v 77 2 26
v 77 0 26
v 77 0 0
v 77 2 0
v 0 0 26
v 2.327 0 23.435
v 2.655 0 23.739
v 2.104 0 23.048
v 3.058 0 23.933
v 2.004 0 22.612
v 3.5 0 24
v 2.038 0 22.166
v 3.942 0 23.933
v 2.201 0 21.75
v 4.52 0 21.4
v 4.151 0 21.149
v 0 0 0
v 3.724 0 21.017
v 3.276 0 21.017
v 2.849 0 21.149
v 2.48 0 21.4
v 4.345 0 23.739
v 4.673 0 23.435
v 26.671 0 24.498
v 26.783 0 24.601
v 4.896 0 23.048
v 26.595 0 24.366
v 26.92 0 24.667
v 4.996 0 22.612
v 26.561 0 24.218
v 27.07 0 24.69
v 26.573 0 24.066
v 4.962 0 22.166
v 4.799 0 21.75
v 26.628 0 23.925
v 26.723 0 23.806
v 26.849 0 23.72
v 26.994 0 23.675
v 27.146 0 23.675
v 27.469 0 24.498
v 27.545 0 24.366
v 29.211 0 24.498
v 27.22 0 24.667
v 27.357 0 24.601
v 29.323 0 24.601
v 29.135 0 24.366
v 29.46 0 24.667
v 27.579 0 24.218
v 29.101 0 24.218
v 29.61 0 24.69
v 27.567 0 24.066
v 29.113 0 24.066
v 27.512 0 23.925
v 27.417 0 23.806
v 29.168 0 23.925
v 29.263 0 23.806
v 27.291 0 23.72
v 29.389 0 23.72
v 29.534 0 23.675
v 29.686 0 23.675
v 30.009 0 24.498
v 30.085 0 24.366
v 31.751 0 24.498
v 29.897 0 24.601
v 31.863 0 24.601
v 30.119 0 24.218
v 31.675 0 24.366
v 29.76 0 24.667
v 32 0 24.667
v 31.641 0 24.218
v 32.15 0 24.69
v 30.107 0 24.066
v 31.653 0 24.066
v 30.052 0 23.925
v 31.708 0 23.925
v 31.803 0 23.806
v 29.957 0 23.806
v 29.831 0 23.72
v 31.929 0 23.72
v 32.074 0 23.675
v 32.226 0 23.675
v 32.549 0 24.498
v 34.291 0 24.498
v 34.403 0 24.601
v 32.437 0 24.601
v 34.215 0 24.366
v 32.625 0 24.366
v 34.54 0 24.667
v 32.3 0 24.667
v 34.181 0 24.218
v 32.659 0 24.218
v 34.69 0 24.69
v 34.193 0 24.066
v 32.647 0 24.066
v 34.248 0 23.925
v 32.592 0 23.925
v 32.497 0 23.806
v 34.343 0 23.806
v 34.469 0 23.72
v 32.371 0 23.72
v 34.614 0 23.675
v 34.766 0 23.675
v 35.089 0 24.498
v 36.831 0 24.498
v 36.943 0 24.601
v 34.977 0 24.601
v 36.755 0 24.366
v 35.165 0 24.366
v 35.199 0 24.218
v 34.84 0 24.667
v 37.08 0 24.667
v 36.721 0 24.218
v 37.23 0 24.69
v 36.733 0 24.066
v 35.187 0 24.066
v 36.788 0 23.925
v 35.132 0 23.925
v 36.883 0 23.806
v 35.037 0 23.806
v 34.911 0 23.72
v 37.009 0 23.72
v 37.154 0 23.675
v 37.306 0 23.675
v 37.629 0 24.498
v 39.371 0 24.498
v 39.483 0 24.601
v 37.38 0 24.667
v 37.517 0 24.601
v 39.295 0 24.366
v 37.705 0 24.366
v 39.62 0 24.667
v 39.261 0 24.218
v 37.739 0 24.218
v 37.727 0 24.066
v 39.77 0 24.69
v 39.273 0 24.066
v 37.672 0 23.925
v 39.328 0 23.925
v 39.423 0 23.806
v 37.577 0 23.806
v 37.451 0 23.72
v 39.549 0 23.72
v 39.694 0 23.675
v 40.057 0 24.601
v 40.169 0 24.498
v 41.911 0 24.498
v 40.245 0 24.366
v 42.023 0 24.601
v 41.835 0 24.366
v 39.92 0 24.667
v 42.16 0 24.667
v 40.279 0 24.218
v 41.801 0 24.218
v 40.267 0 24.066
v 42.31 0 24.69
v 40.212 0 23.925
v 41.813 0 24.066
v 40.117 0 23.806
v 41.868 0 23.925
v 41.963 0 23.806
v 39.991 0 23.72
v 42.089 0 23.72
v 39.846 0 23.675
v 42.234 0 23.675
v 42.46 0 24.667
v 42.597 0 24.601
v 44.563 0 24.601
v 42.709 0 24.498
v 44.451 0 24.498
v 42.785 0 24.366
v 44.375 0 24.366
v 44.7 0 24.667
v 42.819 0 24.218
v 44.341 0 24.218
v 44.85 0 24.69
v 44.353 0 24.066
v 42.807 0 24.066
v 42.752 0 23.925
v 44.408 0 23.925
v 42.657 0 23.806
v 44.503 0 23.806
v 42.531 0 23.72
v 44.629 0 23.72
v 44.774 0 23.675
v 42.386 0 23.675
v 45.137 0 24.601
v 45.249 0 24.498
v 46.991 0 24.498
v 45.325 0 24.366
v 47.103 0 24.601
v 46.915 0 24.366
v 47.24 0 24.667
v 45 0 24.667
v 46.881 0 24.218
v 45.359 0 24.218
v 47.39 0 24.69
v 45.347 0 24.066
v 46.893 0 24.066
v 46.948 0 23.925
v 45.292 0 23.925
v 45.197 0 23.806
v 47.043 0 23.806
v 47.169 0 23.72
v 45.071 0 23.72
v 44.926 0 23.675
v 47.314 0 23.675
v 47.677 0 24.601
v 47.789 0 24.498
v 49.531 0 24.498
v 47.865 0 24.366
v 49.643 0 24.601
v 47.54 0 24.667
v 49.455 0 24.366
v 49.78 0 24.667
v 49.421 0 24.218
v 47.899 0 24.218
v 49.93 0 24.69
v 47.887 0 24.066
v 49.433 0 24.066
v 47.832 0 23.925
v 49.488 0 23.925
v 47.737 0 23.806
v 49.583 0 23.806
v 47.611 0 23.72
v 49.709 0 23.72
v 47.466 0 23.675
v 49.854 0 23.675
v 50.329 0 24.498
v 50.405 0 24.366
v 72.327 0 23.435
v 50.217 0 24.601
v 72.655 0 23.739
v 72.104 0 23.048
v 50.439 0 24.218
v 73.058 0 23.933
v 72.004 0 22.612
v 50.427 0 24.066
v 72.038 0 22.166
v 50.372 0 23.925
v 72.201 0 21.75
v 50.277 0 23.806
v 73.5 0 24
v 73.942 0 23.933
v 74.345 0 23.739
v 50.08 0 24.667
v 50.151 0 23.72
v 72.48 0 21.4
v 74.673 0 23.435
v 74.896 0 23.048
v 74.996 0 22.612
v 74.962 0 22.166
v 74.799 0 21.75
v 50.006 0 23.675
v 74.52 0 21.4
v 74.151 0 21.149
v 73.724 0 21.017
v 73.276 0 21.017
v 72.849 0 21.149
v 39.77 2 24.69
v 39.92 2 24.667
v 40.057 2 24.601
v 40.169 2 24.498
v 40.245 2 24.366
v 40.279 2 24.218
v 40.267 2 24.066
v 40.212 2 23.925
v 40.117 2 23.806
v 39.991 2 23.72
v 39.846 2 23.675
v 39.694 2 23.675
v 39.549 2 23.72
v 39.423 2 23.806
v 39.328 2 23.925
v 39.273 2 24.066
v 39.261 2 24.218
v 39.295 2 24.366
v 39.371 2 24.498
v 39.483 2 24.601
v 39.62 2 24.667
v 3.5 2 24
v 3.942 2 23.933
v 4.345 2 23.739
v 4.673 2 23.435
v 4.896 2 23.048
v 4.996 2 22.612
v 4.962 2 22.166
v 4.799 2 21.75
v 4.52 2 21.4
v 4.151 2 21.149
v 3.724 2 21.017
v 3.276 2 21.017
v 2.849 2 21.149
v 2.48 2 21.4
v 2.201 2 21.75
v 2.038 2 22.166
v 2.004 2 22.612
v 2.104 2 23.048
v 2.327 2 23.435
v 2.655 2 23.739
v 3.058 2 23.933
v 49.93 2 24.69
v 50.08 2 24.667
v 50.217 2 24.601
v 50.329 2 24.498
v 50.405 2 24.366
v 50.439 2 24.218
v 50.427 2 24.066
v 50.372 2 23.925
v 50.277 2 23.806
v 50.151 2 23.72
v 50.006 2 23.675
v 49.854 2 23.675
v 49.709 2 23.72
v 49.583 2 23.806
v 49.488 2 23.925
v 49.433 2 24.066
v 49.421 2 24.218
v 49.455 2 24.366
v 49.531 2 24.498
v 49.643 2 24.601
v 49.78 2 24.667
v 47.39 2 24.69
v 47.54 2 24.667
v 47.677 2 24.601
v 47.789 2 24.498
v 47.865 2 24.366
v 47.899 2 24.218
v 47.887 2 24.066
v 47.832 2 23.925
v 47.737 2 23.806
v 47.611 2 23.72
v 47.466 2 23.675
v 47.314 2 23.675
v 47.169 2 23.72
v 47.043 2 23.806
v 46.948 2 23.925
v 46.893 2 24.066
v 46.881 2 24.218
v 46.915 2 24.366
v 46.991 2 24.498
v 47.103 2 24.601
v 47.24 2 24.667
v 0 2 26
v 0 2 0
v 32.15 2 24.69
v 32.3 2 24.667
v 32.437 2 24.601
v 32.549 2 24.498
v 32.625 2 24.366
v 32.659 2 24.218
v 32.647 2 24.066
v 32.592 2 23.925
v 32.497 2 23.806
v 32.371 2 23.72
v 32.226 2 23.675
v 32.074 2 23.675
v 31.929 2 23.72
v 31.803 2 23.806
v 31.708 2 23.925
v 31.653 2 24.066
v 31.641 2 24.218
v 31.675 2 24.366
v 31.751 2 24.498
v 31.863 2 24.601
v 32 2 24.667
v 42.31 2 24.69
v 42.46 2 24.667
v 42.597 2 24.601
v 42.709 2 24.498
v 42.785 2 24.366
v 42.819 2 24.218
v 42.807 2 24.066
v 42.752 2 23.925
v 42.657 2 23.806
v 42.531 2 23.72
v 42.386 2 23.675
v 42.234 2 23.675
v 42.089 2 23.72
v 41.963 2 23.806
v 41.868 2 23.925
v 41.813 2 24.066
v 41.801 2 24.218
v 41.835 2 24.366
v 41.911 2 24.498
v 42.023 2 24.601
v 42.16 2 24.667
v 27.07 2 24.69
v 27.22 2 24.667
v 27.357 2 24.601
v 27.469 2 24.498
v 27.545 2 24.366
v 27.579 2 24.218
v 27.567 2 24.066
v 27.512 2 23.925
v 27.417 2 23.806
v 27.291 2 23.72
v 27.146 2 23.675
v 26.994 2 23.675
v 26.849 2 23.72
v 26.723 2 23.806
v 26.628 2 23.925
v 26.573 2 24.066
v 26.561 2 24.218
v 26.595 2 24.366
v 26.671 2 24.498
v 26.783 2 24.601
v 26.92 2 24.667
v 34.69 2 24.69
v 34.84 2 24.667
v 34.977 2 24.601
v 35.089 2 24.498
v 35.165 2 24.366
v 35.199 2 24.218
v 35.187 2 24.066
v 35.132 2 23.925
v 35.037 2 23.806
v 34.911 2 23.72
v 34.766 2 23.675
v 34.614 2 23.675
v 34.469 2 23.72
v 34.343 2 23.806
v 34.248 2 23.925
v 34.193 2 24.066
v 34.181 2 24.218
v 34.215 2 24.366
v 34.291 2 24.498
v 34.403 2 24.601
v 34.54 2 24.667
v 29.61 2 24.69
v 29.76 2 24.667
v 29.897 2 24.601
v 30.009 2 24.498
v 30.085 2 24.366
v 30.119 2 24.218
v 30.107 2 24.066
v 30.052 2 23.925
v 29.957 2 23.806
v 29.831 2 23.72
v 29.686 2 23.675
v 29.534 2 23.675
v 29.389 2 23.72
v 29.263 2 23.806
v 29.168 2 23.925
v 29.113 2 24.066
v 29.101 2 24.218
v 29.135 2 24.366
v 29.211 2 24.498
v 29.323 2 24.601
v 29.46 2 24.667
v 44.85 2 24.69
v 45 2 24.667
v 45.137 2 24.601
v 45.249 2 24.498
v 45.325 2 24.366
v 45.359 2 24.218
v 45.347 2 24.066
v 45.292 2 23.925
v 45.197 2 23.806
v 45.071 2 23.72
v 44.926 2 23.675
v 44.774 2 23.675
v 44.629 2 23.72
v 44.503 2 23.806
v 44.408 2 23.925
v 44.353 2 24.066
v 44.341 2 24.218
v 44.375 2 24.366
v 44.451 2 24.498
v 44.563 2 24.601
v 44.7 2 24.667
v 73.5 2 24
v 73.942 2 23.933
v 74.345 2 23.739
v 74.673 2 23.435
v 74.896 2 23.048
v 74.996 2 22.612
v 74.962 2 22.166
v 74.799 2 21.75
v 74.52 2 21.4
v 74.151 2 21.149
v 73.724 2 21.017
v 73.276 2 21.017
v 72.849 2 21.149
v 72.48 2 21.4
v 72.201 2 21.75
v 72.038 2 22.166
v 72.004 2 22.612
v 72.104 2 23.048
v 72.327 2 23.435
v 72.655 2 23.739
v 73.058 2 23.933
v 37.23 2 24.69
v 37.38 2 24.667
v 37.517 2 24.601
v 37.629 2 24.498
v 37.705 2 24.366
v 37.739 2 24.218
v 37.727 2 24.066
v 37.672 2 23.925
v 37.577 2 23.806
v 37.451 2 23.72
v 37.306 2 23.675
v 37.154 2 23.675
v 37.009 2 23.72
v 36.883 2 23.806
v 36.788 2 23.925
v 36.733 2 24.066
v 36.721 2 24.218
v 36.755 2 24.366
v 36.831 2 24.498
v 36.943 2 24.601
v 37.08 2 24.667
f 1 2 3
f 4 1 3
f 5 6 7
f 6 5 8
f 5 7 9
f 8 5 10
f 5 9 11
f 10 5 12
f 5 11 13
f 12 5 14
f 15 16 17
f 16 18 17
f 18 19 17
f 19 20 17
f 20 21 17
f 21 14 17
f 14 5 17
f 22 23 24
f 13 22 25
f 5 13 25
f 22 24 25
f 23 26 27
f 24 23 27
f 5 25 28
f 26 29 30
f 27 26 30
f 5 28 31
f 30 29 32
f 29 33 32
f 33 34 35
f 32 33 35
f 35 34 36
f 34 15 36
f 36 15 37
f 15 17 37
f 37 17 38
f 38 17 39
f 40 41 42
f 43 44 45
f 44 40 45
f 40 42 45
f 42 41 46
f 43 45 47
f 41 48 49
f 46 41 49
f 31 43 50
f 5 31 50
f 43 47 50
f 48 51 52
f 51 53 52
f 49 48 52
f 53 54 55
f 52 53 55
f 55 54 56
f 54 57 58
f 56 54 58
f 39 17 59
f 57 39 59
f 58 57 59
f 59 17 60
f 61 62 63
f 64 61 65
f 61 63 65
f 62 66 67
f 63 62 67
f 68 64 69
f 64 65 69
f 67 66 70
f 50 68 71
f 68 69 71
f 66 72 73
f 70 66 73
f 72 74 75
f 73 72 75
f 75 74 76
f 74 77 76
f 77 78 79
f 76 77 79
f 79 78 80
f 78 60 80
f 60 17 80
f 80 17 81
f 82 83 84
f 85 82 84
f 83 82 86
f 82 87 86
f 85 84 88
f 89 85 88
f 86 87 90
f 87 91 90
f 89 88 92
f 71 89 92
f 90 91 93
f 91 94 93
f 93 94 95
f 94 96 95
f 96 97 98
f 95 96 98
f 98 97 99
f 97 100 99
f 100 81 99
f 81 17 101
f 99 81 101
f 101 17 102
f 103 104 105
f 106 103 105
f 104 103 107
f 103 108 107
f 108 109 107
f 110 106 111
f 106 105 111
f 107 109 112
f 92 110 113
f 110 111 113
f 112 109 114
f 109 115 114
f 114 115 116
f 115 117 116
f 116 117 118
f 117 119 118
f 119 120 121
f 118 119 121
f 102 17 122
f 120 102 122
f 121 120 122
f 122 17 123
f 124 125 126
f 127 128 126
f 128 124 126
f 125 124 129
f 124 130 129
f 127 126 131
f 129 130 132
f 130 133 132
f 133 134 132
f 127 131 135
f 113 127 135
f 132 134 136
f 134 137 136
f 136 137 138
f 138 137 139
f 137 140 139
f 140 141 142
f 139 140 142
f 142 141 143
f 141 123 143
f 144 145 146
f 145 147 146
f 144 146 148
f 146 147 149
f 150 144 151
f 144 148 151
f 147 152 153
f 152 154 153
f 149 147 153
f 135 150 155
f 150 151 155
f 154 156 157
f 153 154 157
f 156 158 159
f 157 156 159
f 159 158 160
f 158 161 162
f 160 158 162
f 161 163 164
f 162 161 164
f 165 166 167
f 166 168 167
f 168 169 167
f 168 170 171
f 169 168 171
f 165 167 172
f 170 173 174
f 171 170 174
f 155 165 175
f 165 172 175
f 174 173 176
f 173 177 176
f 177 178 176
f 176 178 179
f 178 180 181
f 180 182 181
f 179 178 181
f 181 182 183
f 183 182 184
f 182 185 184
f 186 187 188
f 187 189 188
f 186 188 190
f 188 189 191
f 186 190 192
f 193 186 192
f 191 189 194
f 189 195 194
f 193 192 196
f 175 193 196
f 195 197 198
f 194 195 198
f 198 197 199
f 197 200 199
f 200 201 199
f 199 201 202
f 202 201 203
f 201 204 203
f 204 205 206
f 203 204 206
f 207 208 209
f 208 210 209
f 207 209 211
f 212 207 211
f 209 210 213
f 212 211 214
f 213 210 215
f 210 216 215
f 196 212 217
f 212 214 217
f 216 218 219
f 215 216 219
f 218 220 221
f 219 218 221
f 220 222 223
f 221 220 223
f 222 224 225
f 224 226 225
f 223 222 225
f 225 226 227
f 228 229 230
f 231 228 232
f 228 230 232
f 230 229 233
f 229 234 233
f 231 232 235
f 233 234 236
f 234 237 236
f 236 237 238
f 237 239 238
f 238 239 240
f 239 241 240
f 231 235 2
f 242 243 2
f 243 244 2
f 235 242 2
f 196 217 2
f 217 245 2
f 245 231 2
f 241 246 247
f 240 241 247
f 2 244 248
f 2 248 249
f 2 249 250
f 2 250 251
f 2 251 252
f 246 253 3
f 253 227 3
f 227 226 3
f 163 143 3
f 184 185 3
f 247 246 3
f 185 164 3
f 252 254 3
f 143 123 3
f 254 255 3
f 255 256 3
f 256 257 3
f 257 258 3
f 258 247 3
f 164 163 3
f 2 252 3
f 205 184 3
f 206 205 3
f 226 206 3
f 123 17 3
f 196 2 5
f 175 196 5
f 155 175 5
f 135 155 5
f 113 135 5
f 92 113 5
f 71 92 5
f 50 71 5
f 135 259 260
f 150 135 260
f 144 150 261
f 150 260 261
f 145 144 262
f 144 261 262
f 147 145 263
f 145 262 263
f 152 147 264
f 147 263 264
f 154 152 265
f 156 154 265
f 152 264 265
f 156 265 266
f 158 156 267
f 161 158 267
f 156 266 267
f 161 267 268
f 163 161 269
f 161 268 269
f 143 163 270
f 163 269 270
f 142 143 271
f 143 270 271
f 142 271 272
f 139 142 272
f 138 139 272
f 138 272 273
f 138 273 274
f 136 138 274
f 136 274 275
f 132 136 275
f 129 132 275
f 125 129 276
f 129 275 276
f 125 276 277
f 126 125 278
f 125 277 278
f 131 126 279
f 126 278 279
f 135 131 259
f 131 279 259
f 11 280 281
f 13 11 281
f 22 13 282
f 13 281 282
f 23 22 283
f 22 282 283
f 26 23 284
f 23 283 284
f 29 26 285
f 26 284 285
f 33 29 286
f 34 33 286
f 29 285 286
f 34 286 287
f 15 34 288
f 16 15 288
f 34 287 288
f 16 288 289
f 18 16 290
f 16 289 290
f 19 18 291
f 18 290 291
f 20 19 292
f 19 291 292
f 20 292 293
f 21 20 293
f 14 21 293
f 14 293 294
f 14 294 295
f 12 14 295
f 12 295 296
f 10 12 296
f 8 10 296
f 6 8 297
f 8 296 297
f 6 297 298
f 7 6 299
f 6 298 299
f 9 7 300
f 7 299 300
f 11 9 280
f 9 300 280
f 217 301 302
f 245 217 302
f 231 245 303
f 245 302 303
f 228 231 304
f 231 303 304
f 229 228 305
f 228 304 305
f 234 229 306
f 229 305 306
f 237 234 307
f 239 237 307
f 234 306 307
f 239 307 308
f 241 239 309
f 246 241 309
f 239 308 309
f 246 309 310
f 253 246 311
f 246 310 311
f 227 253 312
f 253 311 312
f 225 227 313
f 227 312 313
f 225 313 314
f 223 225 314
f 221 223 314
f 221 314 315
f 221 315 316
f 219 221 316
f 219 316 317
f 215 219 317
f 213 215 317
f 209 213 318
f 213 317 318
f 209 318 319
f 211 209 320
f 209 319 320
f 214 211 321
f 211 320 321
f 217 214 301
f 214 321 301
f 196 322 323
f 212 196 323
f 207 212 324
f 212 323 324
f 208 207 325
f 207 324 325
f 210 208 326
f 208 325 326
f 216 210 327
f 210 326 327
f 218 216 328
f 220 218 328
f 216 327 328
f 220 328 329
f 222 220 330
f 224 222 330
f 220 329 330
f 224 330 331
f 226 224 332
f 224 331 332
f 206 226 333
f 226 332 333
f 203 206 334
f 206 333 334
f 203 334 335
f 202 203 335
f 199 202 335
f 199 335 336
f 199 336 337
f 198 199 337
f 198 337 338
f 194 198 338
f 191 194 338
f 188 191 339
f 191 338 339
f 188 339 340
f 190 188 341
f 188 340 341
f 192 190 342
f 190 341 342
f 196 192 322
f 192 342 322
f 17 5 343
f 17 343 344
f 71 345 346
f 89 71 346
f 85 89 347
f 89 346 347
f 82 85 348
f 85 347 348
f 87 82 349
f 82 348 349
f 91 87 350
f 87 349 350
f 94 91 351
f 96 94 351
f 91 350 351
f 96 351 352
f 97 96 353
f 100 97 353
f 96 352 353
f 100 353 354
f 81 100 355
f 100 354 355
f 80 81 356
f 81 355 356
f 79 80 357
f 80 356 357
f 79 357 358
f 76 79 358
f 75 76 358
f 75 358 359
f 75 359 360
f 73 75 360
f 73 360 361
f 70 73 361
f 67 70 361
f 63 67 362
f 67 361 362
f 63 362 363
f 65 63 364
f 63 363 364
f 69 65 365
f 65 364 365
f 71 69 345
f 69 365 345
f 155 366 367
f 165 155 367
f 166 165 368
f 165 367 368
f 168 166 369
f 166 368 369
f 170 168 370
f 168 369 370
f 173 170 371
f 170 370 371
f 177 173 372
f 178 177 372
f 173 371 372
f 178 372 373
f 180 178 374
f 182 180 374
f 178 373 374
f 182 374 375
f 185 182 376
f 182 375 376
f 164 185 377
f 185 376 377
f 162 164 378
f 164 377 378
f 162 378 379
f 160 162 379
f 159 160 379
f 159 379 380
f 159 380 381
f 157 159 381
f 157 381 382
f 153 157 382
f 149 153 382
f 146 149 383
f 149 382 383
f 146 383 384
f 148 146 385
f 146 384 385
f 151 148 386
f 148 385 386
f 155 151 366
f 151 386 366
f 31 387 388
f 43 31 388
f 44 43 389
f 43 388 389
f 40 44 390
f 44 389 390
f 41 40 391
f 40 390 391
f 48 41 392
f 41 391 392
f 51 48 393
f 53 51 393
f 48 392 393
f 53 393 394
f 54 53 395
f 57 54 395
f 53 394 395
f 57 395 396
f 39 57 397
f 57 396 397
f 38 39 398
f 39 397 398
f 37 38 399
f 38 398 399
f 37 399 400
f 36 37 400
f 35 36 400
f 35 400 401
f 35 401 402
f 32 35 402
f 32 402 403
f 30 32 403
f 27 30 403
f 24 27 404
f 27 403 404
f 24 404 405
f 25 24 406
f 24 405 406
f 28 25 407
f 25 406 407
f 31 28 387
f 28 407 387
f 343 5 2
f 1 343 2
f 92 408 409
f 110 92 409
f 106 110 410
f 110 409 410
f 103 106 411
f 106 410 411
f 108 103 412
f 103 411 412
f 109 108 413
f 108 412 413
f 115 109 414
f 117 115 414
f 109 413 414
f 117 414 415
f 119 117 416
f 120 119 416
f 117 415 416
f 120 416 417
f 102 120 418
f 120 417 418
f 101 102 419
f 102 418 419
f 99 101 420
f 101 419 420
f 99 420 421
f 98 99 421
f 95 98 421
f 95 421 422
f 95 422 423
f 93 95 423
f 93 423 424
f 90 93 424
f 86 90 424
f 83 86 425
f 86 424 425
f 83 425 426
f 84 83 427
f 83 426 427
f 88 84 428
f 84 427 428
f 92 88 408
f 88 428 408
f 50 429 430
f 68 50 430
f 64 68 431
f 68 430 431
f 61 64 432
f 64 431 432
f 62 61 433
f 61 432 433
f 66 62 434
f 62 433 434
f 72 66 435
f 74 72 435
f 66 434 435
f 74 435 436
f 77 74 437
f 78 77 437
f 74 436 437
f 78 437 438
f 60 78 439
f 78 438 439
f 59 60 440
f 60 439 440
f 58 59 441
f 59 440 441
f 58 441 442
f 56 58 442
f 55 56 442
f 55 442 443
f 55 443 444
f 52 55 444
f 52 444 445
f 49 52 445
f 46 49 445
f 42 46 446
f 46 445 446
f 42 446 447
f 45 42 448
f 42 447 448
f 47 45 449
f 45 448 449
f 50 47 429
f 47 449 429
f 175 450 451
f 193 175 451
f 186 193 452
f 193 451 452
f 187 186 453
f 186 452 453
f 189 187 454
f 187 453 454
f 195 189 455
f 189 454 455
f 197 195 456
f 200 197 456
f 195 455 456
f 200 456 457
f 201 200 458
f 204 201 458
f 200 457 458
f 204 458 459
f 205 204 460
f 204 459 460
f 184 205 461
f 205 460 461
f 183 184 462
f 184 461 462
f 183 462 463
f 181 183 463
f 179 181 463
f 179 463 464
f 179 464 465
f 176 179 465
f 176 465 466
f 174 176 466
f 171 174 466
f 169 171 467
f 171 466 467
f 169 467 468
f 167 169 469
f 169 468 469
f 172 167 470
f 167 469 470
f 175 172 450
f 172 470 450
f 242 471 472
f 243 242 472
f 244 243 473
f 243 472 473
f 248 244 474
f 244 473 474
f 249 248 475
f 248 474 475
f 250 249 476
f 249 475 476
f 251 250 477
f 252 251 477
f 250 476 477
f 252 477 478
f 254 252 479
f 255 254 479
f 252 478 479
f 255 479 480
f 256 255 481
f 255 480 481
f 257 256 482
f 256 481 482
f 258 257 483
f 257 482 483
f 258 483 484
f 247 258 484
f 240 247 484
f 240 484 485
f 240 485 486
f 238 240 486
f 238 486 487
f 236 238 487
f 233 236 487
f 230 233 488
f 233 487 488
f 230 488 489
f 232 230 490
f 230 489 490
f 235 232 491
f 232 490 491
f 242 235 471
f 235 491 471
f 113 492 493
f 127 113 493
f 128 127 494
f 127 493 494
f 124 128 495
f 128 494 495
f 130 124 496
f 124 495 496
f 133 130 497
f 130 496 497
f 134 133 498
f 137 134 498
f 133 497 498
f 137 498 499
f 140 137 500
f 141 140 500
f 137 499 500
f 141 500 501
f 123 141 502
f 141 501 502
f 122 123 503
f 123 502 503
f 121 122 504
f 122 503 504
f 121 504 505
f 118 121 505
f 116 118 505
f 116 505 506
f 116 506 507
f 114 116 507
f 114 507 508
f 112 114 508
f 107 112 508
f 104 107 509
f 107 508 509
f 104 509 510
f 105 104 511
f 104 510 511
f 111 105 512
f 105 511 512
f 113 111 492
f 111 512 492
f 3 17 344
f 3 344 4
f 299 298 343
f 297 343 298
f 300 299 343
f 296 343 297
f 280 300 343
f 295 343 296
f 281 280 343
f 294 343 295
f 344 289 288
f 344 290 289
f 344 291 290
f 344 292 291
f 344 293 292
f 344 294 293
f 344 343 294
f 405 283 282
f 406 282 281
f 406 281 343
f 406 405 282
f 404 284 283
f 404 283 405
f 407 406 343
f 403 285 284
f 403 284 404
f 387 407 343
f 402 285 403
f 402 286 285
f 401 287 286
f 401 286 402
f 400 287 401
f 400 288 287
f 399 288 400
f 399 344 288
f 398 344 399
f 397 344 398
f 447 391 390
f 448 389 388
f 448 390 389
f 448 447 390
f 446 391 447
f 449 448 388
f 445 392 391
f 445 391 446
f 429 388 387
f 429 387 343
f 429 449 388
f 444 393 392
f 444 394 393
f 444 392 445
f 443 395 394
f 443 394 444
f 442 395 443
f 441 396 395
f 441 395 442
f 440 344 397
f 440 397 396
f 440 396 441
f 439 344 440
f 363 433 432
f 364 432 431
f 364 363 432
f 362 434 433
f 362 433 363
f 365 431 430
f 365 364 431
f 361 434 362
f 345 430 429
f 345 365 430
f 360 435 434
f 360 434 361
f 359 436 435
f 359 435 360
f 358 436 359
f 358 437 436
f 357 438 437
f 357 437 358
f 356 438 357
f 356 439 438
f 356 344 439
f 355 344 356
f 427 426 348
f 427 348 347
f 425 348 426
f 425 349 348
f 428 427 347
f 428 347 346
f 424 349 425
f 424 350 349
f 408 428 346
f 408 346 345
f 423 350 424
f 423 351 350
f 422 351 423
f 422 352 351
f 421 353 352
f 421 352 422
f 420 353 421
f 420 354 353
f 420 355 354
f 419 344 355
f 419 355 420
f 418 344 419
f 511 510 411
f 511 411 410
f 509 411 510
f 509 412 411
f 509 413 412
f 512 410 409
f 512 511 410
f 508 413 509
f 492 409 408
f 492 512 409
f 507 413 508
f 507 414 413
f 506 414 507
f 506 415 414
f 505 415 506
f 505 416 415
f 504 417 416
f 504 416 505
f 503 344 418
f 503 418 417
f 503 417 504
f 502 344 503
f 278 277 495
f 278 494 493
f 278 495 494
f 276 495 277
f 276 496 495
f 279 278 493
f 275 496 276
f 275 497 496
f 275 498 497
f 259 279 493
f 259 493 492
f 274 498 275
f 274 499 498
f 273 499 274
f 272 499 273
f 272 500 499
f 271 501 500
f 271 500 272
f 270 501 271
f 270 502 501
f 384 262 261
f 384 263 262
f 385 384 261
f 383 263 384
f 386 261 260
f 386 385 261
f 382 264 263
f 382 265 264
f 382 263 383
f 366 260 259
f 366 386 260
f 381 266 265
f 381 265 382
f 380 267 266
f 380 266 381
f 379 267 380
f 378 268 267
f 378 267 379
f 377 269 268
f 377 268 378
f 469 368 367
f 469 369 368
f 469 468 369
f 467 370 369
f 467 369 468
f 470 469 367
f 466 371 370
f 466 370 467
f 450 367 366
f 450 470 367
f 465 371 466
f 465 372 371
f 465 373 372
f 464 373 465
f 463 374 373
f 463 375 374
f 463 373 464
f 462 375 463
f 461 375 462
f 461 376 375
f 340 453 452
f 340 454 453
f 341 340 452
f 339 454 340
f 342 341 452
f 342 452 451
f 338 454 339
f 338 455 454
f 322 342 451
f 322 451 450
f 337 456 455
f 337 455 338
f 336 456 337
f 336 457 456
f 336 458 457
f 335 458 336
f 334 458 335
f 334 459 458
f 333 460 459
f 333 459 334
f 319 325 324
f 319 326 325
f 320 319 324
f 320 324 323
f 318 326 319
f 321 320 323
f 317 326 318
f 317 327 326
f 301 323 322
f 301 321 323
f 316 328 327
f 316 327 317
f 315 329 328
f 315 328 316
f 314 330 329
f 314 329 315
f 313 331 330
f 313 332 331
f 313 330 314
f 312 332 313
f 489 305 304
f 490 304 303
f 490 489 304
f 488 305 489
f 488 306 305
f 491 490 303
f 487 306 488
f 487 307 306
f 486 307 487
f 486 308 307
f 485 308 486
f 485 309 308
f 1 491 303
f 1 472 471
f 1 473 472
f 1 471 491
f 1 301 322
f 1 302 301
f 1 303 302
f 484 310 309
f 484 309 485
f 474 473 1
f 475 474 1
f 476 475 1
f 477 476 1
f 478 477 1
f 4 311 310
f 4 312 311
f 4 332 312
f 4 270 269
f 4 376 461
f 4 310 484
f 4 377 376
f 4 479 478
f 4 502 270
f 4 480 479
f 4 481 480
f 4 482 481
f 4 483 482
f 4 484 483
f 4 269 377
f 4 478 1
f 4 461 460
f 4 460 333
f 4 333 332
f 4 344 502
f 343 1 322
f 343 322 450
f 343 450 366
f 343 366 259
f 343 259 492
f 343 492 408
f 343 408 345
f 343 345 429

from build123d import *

# Parameters (mm, degrees)
SKETCH1_W           = 77
SKETCH1_H           = 26
BOSS_EXTRUDE1_DEPTH = 2
SKETCH2_R           = 1.5
CUT_EXTRUDE1_DEPTH  = 2
SKETCH3_R           = 0.51
CUT_EXTRUDE2_DEPTH  = 2


with BuildPart() as part:
    # Sketch1 → Boss-Extrude1 (new body)
    with BuildSketch(Plane(origin=(0, 0, 0), x_dir=(1, 0, 0), z_dir=(0, 1, 0))):
        with Locations((38.5, -13)):
            Rectangle(SKETCH1_W, SKETCH1_H)
    extrude(amount=BOSS_EXTRUDE1_DEPTH)

    # Sketch2 → Cut-Extrude1 (cut)
    with BuildSketch(Plane(origin=(0, 2, 0), x_dir=(1, 0, 0), z_dir=(0, 1, 0))):
        with Locations((3.5, -22.5)):
            Circle(SKETCH2_R)
        with Locations((73.5, -22.5)):
            Circle(SKETCH2_R)
    extrude(amount=-CUT_EXTRUDE1_DEPTH, mode=Mode.SUBTRACT)

    # Sketch3 → Cut-Extrude2 (cut)
    with BuildSketch(Plane(origin=(0, 2, 0), x_dir=(1, 0, 0), z_dir=(0, 1, 0))):
        with Locations((37.23, -24.179660029)):
            Circle(SKETCH3_R)
        with Locations((34.69, -24.179660029)):
            Circle(SKETCH3_R)
        with Locations((32.15, -24.179660029)):
            Circle(SKETCH3_R)
        with Locations((29.61, -24.179660029)):
            Circle(SKETCH3_R)
        with Locations((27.07, -24.179660029)):
            Circle(SKETCH3_R)
        with Locations((39.77, -24.179660029)):
            Circle(SKETCH3_R)
        with Locations((42.31, -24.179660029)):
            Circle(SKETCH3_R)
        with Locations((44.85, -24.179660029)):
            Circle(SKETCH3_R)
        with Locations((47.39, -24.179660029)):
            Circle(SKETCH3_R)
        with Locations((49.93, -24.179660029)):
            Circle(SKETCH3_R)
    extrude(amount=-CUT_EXTRUDE2_DEPTH, mode=Mode.SUBTRACT)


solid = part.part
